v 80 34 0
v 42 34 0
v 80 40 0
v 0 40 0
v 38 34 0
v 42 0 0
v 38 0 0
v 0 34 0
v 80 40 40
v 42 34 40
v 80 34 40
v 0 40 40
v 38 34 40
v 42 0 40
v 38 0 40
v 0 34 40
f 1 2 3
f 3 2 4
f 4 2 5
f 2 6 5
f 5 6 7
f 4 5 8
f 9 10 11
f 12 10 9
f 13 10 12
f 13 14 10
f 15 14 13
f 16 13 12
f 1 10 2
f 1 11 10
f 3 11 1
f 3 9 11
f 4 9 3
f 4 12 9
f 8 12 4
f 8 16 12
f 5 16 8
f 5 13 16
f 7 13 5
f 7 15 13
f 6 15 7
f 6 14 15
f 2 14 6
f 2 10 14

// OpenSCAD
$fn = 32;

// ----------------------------------------------------------------------
// Structural section: tee 80 x 40 mm
// ----------------------------------------------------------------------

// --- parameters (mm) ---
sec_w = 80;               // tee width, X
sec_h = 40;               // tee height, Y
flange_t = 6;             // top flange thickness
web_t = 4;                // web thickness
plate_t = 40;             // cut length, Z (extrusion height)

profile = [[38, 0], [42, 0], [42, 34], [80, 34], [80, 40], [0, 40], [0, 34], [38, 34]];  // primary outline, 8 points, counter clockwise

// --- the one profile operation ---
linear_extrude(height = plate_t) polygon(points = profile);
